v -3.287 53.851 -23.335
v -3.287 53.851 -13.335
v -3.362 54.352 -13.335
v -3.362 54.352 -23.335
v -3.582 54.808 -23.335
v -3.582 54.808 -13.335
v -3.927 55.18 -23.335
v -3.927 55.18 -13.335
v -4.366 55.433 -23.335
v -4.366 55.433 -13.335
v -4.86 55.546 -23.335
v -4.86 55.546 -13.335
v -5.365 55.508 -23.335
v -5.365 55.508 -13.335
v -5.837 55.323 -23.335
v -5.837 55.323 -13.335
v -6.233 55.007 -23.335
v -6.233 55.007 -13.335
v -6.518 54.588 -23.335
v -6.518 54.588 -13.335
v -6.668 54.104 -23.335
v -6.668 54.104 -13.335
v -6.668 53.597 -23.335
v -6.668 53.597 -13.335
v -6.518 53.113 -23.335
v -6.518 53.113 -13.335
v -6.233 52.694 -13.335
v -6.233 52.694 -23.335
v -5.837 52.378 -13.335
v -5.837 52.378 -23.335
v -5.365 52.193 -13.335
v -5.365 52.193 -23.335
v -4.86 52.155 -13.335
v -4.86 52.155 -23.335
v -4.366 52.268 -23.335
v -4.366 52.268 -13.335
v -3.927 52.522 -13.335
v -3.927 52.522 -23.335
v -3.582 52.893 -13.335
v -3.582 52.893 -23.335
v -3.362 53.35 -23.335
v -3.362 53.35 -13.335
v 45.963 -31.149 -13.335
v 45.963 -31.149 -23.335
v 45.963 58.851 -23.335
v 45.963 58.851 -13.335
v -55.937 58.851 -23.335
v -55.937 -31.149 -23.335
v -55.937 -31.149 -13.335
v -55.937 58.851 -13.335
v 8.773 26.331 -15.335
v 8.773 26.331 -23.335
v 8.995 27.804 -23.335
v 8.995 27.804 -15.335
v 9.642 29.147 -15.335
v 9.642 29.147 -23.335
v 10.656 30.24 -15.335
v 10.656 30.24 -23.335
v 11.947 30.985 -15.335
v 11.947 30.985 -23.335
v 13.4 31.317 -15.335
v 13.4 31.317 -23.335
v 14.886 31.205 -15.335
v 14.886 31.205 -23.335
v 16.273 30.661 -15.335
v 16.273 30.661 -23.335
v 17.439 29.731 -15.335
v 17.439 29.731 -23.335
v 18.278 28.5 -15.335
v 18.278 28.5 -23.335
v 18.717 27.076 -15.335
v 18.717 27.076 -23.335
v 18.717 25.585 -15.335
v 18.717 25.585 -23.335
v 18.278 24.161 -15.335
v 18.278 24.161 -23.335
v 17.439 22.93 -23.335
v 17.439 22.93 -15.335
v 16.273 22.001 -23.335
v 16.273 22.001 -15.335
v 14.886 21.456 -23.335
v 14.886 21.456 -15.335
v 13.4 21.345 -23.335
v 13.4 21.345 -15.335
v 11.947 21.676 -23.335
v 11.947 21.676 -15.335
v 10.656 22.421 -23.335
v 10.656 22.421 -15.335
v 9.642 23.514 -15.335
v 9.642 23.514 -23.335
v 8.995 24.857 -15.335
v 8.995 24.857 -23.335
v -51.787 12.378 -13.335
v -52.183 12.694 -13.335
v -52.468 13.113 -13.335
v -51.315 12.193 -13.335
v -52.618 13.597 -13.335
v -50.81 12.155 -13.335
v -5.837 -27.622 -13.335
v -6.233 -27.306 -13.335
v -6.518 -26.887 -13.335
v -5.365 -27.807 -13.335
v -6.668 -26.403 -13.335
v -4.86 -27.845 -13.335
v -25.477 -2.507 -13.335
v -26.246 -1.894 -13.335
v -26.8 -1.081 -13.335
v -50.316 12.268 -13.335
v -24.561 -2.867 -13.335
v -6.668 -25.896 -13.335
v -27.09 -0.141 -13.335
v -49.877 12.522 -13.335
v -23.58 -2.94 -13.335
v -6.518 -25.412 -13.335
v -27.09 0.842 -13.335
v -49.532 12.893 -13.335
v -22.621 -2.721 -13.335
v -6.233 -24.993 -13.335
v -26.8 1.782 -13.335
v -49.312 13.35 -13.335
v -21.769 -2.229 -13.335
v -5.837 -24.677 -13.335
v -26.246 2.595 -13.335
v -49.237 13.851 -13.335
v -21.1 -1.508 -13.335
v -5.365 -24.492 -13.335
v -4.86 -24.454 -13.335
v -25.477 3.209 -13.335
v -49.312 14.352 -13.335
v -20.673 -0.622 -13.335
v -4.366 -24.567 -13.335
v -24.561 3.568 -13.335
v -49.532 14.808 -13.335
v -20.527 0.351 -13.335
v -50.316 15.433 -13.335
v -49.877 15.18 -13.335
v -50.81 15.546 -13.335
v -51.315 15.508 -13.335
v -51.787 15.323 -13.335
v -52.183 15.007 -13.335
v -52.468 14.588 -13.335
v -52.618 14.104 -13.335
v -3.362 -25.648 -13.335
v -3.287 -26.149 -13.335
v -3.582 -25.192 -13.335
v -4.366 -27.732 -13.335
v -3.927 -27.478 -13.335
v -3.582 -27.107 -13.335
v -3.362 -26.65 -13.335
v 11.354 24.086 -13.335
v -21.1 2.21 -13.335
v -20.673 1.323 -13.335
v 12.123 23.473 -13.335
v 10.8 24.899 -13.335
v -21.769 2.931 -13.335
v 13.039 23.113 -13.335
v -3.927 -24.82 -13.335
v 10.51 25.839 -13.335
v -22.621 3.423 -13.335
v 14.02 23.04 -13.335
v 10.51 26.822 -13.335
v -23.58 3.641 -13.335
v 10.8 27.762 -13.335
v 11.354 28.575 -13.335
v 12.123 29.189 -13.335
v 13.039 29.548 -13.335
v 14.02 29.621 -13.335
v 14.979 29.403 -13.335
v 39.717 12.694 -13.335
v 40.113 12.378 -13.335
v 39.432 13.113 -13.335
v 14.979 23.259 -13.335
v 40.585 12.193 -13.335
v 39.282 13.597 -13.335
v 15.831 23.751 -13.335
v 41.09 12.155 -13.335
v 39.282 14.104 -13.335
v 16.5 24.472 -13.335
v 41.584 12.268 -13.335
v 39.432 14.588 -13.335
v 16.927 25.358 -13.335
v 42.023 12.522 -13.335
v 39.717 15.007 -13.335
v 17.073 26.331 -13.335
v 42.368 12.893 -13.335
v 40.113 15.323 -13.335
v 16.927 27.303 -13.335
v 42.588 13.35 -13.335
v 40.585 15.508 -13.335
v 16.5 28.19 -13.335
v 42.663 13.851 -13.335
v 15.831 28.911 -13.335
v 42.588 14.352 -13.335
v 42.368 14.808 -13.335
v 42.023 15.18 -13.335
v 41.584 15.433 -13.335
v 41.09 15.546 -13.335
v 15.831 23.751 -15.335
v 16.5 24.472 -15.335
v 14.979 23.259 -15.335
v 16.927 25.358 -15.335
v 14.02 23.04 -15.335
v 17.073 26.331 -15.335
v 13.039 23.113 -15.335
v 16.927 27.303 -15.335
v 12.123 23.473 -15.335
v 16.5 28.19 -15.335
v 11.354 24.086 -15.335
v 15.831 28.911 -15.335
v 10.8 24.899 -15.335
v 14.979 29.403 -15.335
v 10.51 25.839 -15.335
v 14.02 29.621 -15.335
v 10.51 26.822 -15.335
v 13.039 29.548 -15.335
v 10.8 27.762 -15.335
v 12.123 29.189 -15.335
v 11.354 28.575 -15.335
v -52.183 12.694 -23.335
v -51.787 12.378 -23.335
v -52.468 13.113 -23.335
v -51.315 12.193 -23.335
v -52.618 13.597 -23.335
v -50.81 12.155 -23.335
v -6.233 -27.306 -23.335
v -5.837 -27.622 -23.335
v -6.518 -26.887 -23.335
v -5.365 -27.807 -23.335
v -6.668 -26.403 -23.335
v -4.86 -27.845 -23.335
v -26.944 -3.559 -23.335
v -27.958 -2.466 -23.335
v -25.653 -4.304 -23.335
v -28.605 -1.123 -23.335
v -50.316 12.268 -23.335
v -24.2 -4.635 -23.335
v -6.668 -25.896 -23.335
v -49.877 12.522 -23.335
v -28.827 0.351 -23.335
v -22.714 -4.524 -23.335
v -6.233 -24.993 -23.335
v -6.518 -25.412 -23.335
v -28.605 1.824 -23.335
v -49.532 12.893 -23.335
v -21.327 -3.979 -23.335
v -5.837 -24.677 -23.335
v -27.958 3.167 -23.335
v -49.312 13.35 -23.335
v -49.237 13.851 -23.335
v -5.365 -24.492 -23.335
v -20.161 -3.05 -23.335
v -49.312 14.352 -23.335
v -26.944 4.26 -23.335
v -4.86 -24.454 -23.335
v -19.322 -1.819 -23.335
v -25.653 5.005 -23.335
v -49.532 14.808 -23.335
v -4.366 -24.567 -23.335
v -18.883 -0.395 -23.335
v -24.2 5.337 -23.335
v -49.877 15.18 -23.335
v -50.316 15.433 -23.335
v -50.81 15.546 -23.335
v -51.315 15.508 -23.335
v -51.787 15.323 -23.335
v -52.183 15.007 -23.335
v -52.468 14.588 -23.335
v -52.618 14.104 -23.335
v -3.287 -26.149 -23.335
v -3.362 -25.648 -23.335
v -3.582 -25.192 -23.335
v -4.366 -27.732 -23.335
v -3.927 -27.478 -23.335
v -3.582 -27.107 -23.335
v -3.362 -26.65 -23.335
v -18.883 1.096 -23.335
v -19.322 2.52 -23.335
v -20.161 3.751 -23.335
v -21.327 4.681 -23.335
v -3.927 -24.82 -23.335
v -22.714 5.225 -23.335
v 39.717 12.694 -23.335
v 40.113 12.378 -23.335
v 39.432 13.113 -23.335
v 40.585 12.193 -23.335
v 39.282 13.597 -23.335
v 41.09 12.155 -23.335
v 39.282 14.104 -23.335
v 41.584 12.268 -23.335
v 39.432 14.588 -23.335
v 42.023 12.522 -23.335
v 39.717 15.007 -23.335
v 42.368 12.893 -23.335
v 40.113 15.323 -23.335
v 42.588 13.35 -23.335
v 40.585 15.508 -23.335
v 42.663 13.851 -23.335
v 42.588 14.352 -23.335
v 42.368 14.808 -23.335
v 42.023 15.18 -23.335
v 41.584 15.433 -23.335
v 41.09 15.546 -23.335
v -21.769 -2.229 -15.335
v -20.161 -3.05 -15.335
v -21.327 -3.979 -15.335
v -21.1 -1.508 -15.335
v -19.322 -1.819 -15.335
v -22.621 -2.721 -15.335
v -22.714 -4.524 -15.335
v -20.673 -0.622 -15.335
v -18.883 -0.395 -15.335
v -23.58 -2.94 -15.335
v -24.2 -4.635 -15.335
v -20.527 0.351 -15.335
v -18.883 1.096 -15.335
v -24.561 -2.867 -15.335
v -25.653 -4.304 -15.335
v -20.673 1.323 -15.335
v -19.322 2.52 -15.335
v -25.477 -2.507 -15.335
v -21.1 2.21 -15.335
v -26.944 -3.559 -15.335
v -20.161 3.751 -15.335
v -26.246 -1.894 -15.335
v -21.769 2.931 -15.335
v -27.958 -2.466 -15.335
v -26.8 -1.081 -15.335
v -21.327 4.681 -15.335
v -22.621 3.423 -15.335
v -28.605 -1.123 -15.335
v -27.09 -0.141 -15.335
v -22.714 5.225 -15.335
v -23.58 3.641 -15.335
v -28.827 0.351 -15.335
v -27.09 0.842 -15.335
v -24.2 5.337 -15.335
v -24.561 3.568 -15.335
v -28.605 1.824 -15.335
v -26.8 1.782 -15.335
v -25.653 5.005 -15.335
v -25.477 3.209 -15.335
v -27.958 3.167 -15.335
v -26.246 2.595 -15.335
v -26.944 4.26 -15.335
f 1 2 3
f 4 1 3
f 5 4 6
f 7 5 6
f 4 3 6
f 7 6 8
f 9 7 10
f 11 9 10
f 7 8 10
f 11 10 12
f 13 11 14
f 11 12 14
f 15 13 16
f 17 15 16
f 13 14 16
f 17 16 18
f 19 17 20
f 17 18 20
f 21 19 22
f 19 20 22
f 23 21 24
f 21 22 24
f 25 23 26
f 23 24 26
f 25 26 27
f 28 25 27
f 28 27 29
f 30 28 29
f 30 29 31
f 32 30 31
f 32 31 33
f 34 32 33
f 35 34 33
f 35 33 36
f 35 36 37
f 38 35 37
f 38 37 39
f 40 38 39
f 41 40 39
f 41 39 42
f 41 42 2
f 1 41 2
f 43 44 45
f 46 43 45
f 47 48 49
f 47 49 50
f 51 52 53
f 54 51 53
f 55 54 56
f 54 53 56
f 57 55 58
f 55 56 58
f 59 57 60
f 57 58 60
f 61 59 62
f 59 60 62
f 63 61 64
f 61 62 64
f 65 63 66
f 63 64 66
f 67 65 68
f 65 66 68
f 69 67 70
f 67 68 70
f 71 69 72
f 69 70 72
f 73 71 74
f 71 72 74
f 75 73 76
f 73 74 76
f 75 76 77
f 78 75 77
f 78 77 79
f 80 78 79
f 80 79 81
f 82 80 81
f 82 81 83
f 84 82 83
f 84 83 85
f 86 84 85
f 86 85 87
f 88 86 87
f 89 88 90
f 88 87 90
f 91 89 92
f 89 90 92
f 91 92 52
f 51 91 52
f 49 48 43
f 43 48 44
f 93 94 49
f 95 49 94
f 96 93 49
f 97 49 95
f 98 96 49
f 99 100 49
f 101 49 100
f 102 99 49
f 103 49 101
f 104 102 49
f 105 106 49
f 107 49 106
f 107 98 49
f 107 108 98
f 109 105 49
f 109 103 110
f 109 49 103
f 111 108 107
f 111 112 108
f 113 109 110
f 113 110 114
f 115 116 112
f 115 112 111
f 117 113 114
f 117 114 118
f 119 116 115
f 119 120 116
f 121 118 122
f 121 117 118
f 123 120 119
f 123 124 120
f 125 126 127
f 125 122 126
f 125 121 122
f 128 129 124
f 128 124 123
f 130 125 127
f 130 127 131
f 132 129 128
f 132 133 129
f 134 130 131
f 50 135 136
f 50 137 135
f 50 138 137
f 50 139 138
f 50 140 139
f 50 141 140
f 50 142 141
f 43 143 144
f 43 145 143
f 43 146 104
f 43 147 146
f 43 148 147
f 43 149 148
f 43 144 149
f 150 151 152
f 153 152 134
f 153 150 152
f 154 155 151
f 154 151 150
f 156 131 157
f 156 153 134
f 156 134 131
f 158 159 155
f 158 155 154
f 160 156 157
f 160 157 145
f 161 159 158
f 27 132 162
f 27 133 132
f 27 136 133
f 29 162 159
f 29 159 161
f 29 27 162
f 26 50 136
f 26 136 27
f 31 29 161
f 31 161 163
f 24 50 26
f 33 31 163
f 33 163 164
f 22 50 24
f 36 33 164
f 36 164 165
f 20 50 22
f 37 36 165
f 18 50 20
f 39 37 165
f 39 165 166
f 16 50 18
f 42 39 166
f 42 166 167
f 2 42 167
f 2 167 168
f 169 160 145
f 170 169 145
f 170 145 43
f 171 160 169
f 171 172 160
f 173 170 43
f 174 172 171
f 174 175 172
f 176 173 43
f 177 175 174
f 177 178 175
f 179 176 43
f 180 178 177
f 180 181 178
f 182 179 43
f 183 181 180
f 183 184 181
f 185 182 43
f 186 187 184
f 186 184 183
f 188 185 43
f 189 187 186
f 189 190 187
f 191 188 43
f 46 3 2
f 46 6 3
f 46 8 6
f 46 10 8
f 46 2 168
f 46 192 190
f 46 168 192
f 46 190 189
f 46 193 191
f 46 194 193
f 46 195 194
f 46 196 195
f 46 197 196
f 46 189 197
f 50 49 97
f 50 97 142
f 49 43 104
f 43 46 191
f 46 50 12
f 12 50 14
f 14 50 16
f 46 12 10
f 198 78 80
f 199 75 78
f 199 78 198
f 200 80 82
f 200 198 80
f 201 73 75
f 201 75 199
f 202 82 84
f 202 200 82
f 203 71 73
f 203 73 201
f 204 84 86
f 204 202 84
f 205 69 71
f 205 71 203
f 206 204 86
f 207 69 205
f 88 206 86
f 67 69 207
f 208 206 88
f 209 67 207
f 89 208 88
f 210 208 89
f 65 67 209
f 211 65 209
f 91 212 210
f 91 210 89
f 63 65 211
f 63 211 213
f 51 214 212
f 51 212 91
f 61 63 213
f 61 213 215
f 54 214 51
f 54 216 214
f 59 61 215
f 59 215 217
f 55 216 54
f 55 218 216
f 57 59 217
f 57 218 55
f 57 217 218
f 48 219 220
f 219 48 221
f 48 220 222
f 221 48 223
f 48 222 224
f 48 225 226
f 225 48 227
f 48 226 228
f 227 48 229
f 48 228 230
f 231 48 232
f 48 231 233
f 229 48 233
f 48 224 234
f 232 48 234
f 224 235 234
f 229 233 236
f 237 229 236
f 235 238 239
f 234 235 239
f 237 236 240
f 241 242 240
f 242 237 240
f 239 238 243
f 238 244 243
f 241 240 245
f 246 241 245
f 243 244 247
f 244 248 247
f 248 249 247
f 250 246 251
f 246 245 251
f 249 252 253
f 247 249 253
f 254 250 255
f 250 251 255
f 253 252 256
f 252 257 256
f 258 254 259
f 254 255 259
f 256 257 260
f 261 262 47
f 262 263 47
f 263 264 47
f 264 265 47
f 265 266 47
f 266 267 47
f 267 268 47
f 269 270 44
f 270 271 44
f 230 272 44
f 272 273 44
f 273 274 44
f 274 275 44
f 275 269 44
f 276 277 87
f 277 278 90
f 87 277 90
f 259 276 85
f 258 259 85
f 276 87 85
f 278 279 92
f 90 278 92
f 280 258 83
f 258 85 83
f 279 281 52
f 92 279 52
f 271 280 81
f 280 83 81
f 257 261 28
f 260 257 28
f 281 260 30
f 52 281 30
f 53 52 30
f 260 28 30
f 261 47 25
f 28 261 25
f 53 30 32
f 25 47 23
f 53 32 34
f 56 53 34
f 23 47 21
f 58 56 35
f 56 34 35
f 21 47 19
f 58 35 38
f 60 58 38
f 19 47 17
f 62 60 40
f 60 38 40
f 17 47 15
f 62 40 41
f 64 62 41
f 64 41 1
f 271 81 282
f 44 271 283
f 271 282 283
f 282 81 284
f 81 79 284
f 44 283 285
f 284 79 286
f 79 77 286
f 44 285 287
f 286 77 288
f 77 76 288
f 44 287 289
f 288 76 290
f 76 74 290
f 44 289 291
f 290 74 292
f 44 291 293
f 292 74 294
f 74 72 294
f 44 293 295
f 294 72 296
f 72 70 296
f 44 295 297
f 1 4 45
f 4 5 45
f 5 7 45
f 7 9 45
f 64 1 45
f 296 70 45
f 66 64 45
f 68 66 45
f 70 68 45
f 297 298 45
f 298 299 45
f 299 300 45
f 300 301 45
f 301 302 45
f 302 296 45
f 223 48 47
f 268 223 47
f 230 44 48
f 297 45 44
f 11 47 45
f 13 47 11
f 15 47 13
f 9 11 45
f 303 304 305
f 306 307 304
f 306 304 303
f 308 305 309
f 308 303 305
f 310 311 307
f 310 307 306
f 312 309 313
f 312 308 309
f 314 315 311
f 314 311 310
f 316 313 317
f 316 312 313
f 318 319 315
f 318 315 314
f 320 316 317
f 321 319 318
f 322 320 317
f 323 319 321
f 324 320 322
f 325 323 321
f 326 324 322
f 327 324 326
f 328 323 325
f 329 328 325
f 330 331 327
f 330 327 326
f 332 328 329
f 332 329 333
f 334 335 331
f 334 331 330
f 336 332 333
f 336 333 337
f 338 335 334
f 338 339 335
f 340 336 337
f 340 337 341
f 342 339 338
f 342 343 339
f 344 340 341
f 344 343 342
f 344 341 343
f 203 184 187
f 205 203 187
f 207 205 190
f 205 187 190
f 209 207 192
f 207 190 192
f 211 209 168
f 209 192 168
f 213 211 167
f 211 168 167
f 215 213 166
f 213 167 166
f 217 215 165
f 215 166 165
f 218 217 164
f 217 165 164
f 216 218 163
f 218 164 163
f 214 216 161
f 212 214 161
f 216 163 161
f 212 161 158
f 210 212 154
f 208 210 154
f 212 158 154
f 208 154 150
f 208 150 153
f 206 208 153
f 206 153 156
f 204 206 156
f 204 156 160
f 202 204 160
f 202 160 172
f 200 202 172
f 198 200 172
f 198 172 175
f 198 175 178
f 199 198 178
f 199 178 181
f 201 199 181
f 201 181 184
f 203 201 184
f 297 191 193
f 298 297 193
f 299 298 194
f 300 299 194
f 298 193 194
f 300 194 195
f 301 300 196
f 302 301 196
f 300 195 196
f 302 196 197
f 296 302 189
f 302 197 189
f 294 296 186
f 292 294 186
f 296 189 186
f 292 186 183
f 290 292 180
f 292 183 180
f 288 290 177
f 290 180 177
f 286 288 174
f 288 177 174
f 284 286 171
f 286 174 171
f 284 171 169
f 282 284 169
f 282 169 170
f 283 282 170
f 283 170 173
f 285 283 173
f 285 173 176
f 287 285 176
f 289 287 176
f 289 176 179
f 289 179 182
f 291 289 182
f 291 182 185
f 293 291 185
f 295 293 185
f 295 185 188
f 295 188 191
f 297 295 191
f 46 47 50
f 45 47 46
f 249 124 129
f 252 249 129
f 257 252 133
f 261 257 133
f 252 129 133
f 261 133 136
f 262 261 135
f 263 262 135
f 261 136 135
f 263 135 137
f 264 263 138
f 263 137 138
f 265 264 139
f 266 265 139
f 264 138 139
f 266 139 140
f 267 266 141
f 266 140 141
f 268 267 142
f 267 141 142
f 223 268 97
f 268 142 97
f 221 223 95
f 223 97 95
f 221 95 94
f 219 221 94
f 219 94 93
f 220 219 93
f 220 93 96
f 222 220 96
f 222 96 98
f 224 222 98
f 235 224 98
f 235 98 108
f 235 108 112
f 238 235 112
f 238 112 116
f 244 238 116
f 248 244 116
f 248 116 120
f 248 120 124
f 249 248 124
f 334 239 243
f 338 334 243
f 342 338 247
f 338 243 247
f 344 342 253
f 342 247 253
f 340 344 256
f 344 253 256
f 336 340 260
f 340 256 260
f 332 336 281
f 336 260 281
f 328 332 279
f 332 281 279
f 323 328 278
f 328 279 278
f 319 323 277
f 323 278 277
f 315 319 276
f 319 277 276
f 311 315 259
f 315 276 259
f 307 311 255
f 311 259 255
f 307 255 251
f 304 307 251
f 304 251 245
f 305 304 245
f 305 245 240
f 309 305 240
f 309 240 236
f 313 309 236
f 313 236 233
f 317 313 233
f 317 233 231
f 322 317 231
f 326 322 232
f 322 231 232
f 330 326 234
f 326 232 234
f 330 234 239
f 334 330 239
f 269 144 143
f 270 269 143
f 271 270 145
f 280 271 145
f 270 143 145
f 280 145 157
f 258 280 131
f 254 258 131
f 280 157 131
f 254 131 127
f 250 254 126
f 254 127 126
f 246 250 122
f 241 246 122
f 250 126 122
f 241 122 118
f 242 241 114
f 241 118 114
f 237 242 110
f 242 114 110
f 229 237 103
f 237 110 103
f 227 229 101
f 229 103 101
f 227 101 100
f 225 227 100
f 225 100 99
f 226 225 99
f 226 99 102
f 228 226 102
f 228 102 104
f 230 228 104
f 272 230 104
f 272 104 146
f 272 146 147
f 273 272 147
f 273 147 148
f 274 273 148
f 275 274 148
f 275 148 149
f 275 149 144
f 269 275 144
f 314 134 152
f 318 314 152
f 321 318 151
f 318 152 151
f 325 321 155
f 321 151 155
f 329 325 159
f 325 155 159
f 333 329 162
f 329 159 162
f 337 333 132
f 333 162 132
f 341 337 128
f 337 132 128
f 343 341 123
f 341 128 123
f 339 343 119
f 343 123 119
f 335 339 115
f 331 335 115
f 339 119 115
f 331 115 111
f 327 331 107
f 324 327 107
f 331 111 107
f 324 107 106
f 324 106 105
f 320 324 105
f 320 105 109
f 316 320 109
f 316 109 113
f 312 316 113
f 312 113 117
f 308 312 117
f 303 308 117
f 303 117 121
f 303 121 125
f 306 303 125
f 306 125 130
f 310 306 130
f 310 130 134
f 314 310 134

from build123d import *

# Parameters (mm, degrees)
ESBO_O1_W                = 101.9
ESBO_O1_H                = 90
RESSALTO_EXTRUS_O1_DEPTH = 10
FURO_COM_FOLGA_DE_M39_D  = 3.4
ESBO_O11_R               = 5
CORTE_EXTRUS_O1_DEPTH    = 8
FURO_COM_FOLGA_DE_M61_D  = 6.6


with BuildPart() as part:
    # Esboço1 → Ressalto-extrusão1 (new body)
    with BuildSketch(Plane.XY.offset(-23.335035958)):
        with Locations((-4.986758439, 13.850631826)):
            Rectangle(ESBO_O1_W, ESBO_O1_H)
    extrude(amount=RESSALTO_EXTRUS_O1_DEPTH)

    # Furo com folga de M39 (through all)
    with Locations(Plane(origin=(0, 0, -23.335035958), x_dir=(-1, 0, 0), z_dir=(0, 0, -1))):
        with Locations((-40.963241561, 13.850631826), (4.986758439, 53.850631826), (50.936758439, 13.850631826), (4.986758439, -26.149368174)):
            Hole(FURO_COM_FOLGA_DE_M39_D / 2)

    # Esboço11 → Corte-extrusão1 (cut)
    with BuildSketch(Plane(origin=(0, 0, -23.335035958), x_dir=(-1, 0, 0), z_dir=(0, 0, -1))):
        with Locations((-13.773241561, 26.330631826)):
            Circle(ESBO_O11_R)
        with Locations((23.826758439, 0.350631826)):
            Circle(ESBO_O11_R)
    extrude(amount=-CORTE_EXTRUS_O1_DEPTH, mode=Mode.SUBTRACT)

    # Furo com folga de M61 (through all)
    with Locations(Plane(origin=(0, 0, -15.335035958), x_dir=(-1, 0, 0), z_dir=(0, 0, -1))):
        with Locations((-13.773241561, 26.330631826), (23.826758439, 0.350631826)):
            Hole(FURO_COM_FOLGA_DE_M61_D / 2)


solid = part.part
